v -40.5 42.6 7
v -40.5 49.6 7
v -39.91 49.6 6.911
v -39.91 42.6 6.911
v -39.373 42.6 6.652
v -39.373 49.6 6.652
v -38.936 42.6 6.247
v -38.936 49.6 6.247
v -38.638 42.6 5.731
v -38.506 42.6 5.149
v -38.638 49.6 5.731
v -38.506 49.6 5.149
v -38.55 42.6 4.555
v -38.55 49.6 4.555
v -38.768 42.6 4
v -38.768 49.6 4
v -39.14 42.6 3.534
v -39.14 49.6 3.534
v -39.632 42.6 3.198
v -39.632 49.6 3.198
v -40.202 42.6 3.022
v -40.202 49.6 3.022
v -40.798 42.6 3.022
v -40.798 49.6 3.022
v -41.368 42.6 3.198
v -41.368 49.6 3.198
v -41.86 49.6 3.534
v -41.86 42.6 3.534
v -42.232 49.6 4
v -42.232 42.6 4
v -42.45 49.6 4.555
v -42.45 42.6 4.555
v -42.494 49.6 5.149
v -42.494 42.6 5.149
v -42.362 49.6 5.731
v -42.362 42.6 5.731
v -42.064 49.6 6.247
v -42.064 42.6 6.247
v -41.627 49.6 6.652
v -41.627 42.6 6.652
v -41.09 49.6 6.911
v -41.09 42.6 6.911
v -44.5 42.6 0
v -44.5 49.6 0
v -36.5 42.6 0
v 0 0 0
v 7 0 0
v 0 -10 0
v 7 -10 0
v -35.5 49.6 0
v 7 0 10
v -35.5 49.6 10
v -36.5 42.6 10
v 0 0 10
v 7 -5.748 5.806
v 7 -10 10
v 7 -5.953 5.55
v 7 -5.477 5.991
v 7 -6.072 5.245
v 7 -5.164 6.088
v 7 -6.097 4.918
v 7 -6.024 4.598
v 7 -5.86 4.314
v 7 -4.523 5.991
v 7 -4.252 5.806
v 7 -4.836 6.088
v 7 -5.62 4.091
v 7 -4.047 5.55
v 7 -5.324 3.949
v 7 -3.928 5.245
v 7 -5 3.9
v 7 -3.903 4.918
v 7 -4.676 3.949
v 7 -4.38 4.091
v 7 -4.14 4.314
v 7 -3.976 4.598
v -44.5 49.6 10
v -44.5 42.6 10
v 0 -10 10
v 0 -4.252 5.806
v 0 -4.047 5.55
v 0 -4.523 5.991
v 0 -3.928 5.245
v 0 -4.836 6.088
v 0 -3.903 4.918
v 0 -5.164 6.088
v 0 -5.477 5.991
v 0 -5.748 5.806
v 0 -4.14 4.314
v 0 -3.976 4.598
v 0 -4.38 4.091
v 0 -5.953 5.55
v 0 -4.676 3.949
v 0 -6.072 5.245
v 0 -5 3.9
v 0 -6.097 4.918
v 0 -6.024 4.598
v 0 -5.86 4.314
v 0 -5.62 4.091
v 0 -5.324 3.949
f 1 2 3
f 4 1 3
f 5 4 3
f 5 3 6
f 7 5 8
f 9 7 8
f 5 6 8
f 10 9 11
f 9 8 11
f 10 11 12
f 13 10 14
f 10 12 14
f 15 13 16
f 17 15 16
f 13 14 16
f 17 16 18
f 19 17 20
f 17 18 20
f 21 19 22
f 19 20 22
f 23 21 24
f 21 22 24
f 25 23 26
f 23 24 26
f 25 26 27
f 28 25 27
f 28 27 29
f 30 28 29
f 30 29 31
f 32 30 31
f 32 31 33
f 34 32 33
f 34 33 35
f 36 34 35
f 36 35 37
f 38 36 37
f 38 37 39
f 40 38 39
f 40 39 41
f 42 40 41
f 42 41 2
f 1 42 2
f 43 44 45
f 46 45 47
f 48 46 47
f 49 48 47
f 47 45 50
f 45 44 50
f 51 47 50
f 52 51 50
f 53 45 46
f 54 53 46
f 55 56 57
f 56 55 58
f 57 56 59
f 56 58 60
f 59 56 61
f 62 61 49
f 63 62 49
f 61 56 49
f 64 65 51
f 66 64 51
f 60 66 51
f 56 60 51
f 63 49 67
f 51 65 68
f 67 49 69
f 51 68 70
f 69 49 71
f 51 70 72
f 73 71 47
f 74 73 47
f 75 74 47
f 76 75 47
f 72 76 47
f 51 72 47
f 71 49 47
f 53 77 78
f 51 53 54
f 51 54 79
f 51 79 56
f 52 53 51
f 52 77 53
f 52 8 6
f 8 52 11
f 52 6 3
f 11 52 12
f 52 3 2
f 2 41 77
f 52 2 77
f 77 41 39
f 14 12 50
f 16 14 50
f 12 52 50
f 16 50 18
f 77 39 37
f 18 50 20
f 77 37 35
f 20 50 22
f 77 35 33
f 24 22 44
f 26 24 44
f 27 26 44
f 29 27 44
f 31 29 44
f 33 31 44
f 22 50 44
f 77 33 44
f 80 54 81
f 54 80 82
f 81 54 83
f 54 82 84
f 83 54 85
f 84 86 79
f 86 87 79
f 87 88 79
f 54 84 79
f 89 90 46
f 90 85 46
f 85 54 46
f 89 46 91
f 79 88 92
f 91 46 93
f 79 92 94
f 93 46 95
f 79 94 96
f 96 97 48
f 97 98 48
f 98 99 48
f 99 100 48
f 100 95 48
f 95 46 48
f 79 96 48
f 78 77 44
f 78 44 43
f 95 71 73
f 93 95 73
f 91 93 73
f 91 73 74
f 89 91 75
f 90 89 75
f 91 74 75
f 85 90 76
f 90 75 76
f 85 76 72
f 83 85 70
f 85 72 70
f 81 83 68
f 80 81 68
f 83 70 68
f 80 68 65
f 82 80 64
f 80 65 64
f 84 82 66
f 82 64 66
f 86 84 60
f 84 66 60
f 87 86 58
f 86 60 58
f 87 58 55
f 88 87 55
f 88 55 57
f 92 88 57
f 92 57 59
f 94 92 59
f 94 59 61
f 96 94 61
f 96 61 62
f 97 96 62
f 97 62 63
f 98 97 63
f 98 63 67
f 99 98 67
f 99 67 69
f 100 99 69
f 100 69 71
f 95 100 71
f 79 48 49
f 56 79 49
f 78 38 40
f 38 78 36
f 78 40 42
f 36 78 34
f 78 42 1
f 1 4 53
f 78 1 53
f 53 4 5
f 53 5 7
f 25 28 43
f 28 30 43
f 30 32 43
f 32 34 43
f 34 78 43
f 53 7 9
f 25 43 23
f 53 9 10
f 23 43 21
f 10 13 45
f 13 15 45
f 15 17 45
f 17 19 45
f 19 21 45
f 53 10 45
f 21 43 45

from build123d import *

# Parameters (mm, degrees)
SALIENTE_EXTRUIR1_DEPTH = 10
CROQUIS3_R              = 2
CORTAR_EXTRUIR2_DEPTH   = 10
CROQUIS4_R              = 1.1
CORTAR_EXTRUIR3_DEPTH   = 10


with BuildPart() as part:
    # Croquis1 → Saliente-Extruir1 (new body)
    with BuildSketch(Plane.XY):
        Polygon((-36.499720763, 42.6), (0, 0), (0, -10), (7, -10), (7, 0), (-35.5, 49.6), (-44.5, 49.6), (-44.5, 42.6), align=None)
    extrude(amount=SALIENTE_EXTRUIR1_DEPTH)

    # Croquis3 → Cortar-Extruir2 (cut)
    with BuildSketch(Plane(origin=(0, 49.6, 0), x_dir=(1, 0, 0), z_dir=(0, 1, 0))):
        with Locations(Location((-40.5, -5, 0), (0, 0, 270))):
            Circle(CROQUIS3_R)
    extrude(amount=-CORTAR_EXTRUIR2_DEPTH, mode=Mode.SUBTRACT)

    # Croquis4 → Cortar-Extruir3 (cut)
    with BuildSketch(Plane(origin=(7, 0, 0), x_dir=(0, 0, -1), z_dir=(1, 0, 0))):
        with Locations((-5, -5)):
            Circle(CROQUIS4_R)
    extrude(amount=-CORTAR_EXTRUIR3_DEPTH, mode=Mode.SUBTRACT)


solid = part.part
